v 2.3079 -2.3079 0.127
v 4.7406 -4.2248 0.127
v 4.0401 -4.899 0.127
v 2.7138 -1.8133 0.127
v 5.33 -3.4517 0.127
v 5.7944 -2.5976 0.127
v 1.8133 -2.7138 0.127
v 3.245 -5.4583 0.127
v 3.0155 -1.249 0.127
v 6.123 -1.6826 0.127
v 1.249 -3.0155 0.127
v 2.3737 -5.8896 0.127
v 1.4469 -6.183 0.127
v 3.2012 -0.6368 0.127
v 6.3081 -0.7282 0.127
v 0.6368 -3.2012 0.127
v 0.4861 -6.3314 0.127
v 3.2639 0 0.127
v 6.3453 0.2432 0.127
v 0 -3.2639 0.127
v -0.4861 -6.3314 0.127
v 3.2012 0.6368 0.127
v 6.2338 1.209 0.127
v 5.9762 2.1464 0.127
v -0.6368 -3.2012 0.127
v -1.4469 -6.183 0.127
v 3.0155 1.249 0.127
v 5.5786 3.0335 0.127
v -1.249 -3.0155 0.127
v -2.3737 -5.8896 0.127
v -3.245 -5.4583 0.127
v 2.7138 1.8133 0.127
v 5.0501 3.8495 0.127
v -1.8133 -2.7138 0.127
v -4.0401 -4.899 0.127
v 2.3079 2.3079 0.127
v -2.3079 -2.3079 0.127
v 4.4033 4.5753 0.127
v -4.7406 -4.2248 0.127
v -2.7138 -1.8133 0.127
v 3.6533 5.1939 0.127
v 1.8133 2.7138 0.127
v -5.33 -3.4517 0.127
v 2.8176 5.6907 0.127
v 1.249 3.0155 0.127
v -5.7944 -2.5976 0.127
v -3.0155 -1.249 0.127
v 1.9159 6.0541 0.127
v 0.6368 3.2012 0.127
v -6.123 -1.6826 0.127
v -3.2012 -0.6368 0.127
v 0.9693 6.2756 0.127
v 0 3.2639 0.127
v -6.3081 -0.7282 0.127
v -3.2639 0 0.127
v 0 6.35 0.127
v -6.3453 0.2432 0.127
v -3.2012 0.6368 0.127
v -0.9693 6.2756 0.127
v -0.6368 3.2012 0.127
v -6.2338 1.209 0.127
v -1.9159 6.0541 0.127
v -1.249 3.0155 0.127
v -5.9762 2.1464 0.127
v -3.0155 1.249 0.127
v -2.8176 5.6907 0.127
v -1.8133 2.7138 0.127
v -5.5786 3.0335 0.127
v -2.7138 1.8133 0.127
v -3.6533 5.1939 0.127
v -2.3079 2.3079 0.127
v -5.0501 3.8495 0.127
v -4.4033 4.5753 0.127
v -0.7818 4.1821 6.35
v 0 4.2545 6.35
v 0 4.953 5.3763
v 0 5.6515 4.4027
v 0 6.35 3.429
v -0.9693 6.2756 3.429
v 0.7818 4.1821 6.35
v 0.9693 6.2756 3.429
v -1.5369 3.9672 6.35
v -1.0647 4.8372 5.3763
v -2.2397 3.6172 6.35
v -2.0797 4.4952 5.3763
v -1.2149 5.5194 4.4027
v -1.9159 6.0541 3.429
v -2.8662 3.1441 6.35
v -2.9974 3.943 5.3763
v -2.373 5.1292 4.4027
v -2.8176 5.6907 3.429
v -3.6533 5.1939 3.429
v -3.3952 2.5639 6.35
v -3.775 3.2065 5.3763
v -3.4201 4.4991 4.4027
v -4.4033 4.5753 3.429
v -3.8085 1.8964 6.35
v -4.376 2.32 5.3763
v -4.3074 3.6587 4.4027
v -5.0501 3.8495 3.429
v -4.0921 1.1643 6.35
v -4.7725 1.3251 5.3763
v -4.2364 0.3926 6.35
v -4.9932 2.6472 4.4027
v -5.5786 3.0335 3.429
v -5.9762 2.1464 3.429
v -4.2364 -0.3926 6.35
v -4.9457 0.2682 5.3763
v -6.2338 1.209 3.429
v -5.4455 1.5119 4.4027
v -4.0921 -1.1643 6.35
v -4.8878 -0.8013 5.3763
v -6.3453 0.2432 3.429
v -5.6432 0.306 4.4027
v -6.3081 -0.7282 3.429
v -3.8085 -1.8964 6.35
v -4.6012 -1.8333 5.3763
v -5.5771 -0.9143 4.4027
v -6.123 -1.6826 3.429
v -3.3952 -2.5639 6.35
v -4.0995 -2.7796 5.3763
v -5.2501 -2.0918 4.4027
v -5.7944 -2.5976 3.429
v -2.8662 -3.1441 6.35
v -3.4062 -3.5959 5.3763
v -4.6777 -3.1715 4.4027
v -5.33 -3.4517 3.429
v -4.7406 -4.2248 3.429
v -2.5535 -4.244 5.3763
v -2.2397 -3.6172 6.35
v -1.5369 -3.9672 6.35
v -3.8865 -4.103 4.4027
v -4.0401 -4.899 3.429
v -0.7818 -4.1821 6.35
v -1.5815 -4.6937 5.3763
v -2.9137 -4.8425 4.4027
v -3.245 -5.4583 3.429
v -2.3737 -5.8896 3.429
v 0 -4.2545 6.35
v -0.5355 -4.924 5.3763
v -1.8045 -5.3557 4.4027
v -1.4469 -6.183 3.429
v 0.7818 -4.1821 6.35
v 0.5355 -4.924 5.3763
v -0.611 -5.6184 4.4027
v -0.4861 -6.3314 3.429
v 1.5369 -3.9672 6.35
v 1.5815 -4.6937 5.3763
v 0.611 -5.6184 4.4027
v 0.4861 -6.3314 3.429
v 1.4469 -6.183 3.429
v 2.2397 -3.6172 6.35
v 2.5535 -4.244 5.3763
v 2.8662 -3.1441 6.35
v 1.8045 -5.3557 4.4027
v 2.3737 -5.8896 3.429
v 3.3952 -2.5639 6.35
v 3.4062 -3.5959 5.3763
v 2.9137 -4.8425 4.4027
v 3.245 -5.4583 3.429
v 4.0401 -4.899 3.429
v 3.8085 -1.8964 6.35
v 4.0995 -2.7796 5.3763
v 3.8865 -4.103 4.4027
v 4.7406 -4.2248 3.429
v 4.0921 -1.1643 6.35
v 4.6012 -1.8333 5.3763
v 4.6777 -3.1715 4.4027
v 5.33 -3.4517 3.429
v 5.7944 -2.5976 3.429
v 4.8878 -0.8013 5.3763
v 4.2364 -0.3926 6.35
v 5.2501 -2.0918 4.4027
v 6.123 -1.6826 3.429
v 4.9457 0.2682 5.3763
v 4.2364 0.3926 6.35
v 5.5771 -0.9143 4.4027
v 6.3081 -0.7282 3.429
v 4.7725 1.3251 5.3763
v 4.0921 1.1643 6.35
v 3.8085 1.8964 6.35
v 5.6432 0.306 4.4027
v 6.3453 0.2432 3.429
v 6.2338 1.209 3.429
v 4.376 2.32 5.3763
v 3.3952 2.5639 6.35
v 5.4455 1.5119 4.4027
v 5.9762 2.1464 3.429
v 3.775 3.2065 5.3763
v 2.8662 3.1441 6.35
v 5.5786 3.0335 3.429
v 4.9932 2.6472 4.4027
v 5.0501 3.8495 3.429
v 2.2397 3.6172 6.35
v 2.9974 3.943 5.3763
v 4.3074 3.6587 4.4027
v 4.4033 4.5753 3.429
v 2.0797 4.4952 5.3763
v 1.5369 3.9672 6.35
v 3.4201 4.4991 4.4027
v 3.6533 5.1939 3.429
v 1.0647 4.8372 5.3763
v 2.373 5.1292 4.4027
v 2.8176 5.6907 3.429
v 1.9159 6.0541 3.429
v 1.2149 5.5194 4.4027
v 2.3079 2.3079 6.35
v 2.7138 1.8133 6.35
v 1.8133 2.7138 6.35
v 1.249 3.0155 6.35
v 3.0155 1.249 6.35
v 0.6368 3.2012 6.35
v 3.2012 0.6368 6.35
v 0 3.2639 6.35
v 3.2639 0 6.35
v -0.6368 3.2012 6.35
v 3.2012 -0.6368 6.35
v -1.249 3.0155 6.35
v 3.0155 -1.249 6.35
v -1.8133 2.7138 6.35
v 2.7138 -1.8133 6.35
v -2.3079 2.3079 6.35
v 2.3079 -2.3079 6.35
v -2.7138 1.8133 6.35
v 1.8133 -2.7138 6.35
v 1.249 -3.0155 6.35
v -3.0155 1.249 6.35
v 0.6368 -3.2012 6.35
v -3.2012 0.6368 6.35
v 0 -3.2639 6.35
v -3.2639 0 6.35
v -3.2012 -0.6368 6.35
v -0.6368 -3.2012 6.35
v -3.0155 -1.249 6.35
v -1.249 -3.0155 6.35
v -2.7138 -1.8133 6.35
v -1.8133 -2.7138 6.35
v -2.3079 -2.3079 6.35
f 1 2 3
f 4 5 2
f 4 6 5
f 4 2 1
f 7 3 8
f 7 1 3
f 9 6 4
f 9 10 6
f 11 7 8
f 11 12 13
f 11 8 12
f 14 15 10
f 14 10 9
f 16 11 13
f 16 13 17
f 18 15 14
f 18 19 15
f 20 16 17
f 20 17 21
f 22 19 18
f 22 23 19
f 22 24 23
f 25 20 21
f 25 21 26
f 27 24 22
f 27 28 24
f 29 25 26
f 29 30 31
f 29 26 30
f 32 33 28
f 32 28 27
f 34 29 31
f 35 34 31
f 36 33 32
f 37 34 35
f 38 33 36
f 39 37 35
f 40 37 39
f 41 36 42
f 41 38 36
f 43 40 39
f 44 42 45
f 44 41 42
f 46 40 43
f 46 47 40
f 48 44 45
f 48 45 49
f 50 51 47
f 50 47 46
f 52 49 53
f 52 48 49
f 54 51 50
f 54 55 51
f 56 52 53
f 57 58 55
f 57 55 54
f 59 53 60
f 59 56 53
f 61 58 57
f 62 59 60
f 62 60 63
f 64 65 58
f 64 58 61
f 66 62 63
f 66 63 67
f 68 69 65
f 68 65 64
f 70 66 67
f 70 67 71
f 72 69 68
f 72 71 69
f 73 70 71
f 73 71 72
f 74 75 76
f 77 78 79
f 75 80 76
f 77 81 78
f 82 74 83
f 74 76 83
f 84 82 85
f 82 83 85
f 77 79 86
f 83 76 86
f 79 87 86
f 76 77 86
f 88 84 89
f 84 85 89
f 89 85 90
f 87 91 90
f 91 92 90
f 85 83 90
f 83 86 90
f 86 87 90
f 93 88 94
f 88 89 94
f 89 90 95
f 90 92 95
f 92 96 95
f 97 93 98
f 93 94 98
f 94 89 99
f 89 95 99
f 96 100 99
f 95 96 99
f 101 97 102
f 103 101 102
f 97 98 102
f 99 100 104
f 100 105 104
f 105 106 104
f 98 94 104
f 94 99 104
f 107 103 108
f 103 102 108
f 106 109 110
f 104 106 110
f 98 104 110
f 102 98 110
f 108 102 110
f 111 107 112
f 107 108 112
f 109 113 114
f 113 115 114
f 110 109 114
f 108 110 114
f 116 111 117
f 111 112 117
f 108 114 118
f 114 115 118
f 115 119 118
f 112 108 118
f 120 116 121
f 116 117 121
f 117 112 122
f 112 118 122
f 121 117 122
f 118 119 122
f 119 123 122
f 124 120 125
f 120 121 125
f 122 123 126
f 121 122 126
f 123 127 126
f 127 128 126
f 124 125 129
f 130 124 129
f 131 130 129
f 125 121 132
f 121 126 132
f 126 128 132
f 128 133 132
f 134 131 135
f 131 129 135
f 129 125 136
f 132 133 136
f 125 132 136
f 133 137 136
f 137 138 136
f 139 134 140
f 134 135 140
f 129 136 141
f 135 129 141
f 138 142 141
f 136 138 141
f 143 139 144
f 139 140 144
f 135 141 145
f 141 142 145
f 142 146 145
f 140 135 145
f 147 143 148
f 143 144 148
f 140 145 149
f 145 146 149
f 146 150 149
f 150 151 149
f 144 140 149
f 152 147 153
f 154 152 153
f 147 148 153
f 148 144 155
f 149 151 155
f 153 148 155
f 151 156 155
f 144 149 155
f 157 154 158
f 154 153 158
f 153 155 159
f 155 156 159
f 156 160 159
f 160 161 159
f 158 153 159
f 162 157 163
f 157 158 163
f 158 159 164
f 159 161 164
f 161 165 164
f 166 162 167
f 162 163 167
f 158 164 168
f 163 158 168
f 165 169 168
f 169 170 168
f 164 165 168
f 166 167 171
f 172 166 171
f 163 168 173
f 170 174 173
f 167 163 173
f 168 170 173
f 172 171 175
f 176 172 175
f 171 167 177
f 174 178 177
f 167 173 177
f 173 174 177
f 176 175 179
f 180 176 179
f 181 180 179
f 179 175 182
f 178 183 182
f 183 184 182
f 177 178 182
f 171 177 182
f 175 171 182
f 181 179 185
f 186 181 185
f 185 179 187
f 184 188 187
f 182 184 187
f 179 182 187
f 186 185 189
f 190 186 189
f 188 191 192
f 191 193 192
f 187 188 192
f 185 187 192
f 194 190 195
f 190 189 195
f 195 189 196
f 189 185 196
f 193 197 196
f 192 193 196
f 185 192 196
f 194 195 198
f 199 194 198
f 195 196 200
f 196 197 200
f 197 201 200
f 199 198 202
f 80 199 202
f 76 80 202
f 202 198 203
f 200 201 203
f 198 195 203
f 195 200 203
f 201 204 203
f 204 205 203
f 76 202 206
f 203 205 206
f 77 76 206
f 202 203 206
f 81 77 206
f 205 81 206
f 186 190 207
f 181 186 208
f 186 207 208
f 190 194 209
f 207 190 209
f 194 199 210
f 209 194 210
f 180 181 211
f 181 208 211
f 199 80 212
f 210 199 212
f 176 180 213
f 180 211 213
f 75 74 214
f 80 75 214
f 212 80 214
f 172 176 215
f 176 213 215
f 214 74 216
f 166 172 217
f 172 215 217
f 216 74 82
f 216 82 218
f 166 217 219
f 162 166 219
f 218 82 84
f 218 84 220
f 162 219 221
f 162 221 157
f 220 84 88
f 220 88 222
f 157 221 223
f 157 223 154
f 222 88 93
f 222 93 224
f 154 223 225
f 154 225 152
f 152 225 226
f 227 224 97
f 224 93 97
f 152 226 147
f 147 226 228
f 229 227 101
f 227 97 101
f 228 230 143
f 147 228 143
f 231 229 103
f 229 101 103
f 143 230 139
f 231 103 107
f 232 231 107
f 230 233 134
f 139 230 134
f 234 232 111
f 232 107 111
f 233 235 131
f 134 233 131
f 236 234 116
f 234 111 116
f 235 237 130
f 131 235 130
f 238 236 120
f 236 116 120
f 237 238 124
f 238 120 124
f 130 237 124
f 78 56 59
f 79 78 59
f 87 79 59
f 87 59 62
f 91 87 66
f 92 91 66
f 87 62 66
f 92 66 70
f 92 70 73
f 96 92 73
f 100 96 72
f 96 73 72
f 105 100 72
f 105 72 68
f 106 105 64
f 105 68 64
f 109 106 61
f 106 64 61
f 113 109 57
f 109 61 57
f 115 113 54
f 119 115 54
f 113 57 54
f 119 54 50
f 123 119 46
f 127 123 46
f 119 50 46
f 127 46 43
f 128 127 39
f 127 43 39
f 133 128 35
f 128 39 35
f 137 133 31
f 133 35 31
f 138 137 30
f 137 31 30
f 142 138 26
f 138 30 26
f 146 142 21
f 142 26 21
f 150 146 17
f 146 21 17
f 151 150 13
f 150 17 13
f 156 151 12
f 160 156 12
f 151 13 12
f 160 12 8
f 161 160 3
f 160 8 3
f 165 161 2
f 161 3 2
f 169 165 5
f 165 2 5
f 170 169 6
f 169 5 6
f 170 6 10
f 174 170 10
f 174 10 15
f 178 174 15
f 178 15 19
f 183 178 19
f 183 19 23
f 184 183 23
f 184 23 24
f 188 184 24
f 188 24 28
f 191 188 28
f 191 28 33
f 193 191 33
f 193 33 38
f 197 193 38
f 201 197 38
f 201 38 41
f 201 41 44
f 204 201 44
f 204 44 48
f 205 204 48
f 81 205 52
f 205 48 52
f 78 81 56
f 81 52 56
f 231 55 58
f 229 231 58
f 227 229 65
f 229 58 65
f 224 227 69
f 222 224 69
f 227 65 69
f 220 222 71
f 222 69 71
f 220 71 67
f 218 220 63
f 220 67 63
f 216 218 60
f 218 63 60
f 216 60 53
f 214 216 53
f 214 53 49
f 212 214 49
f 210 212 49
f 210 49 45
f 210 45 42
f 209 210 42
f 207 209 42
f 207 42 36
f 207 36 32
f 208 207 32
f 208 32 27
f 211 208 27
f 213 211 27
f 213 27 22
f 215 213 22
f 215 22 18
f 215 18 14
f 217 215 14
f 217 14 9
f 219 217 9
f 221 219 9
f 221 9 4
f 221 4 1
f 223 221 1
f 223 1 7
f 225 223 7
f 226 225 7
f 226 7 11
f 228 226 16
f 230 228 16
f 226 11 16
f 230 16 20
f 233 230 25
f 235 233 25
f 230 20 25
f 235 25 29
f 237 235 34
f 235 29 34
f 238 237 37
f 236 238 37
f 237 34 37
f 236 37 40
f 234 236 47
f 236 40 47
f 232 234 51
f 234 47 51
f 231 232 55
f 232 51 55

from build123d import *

# Parameters (mm, degrees)
F_1_4_CLEARANCE_HOLE1_D = 6.5278
SKETCH4_W               = 12.7
SKETCH4_H               = 12.7
CUT_EXTRUDE1_DEPTH      = 0.127


with BuildPart() as part:
    # Sketch1 → Revolve1 (revolve)
    with BuildSketch(Plane(origin=(0, 0, 0), x_dir=(0, 0, -1), z_dir=(1, 0, 0))):
        Polygon((-6.35, 0), (-6.35, 4.2545), (-3.429, 6.35), (0, 6.35), (0, 0), align=None)
    revolve(axis=Axis((0, 0, 0), (0, 0, 1)))

    # 1/4 Clearance Hole1 (through all)
    with Locations(Plane.XY.offset(6.35)):
        with Locations((0, 0)):
            Hole(F_1_4_CLEARANCE_HOLE1_D / 2)

    # Sketch4 → Cut-Extrude1 (cut)
    with BuildSketch(Plane(origin=(0, 0, 0), x_dir=(-1, 0, 0), z_dir=(0, 0, -1))):
        Rectangle(SKETCH4_W, SKETCH4_H)
    extrude(amount=-CUT_EXTRUDE1_DEPTH, mode=Mode.SUBTRACT)


solid = part.part
